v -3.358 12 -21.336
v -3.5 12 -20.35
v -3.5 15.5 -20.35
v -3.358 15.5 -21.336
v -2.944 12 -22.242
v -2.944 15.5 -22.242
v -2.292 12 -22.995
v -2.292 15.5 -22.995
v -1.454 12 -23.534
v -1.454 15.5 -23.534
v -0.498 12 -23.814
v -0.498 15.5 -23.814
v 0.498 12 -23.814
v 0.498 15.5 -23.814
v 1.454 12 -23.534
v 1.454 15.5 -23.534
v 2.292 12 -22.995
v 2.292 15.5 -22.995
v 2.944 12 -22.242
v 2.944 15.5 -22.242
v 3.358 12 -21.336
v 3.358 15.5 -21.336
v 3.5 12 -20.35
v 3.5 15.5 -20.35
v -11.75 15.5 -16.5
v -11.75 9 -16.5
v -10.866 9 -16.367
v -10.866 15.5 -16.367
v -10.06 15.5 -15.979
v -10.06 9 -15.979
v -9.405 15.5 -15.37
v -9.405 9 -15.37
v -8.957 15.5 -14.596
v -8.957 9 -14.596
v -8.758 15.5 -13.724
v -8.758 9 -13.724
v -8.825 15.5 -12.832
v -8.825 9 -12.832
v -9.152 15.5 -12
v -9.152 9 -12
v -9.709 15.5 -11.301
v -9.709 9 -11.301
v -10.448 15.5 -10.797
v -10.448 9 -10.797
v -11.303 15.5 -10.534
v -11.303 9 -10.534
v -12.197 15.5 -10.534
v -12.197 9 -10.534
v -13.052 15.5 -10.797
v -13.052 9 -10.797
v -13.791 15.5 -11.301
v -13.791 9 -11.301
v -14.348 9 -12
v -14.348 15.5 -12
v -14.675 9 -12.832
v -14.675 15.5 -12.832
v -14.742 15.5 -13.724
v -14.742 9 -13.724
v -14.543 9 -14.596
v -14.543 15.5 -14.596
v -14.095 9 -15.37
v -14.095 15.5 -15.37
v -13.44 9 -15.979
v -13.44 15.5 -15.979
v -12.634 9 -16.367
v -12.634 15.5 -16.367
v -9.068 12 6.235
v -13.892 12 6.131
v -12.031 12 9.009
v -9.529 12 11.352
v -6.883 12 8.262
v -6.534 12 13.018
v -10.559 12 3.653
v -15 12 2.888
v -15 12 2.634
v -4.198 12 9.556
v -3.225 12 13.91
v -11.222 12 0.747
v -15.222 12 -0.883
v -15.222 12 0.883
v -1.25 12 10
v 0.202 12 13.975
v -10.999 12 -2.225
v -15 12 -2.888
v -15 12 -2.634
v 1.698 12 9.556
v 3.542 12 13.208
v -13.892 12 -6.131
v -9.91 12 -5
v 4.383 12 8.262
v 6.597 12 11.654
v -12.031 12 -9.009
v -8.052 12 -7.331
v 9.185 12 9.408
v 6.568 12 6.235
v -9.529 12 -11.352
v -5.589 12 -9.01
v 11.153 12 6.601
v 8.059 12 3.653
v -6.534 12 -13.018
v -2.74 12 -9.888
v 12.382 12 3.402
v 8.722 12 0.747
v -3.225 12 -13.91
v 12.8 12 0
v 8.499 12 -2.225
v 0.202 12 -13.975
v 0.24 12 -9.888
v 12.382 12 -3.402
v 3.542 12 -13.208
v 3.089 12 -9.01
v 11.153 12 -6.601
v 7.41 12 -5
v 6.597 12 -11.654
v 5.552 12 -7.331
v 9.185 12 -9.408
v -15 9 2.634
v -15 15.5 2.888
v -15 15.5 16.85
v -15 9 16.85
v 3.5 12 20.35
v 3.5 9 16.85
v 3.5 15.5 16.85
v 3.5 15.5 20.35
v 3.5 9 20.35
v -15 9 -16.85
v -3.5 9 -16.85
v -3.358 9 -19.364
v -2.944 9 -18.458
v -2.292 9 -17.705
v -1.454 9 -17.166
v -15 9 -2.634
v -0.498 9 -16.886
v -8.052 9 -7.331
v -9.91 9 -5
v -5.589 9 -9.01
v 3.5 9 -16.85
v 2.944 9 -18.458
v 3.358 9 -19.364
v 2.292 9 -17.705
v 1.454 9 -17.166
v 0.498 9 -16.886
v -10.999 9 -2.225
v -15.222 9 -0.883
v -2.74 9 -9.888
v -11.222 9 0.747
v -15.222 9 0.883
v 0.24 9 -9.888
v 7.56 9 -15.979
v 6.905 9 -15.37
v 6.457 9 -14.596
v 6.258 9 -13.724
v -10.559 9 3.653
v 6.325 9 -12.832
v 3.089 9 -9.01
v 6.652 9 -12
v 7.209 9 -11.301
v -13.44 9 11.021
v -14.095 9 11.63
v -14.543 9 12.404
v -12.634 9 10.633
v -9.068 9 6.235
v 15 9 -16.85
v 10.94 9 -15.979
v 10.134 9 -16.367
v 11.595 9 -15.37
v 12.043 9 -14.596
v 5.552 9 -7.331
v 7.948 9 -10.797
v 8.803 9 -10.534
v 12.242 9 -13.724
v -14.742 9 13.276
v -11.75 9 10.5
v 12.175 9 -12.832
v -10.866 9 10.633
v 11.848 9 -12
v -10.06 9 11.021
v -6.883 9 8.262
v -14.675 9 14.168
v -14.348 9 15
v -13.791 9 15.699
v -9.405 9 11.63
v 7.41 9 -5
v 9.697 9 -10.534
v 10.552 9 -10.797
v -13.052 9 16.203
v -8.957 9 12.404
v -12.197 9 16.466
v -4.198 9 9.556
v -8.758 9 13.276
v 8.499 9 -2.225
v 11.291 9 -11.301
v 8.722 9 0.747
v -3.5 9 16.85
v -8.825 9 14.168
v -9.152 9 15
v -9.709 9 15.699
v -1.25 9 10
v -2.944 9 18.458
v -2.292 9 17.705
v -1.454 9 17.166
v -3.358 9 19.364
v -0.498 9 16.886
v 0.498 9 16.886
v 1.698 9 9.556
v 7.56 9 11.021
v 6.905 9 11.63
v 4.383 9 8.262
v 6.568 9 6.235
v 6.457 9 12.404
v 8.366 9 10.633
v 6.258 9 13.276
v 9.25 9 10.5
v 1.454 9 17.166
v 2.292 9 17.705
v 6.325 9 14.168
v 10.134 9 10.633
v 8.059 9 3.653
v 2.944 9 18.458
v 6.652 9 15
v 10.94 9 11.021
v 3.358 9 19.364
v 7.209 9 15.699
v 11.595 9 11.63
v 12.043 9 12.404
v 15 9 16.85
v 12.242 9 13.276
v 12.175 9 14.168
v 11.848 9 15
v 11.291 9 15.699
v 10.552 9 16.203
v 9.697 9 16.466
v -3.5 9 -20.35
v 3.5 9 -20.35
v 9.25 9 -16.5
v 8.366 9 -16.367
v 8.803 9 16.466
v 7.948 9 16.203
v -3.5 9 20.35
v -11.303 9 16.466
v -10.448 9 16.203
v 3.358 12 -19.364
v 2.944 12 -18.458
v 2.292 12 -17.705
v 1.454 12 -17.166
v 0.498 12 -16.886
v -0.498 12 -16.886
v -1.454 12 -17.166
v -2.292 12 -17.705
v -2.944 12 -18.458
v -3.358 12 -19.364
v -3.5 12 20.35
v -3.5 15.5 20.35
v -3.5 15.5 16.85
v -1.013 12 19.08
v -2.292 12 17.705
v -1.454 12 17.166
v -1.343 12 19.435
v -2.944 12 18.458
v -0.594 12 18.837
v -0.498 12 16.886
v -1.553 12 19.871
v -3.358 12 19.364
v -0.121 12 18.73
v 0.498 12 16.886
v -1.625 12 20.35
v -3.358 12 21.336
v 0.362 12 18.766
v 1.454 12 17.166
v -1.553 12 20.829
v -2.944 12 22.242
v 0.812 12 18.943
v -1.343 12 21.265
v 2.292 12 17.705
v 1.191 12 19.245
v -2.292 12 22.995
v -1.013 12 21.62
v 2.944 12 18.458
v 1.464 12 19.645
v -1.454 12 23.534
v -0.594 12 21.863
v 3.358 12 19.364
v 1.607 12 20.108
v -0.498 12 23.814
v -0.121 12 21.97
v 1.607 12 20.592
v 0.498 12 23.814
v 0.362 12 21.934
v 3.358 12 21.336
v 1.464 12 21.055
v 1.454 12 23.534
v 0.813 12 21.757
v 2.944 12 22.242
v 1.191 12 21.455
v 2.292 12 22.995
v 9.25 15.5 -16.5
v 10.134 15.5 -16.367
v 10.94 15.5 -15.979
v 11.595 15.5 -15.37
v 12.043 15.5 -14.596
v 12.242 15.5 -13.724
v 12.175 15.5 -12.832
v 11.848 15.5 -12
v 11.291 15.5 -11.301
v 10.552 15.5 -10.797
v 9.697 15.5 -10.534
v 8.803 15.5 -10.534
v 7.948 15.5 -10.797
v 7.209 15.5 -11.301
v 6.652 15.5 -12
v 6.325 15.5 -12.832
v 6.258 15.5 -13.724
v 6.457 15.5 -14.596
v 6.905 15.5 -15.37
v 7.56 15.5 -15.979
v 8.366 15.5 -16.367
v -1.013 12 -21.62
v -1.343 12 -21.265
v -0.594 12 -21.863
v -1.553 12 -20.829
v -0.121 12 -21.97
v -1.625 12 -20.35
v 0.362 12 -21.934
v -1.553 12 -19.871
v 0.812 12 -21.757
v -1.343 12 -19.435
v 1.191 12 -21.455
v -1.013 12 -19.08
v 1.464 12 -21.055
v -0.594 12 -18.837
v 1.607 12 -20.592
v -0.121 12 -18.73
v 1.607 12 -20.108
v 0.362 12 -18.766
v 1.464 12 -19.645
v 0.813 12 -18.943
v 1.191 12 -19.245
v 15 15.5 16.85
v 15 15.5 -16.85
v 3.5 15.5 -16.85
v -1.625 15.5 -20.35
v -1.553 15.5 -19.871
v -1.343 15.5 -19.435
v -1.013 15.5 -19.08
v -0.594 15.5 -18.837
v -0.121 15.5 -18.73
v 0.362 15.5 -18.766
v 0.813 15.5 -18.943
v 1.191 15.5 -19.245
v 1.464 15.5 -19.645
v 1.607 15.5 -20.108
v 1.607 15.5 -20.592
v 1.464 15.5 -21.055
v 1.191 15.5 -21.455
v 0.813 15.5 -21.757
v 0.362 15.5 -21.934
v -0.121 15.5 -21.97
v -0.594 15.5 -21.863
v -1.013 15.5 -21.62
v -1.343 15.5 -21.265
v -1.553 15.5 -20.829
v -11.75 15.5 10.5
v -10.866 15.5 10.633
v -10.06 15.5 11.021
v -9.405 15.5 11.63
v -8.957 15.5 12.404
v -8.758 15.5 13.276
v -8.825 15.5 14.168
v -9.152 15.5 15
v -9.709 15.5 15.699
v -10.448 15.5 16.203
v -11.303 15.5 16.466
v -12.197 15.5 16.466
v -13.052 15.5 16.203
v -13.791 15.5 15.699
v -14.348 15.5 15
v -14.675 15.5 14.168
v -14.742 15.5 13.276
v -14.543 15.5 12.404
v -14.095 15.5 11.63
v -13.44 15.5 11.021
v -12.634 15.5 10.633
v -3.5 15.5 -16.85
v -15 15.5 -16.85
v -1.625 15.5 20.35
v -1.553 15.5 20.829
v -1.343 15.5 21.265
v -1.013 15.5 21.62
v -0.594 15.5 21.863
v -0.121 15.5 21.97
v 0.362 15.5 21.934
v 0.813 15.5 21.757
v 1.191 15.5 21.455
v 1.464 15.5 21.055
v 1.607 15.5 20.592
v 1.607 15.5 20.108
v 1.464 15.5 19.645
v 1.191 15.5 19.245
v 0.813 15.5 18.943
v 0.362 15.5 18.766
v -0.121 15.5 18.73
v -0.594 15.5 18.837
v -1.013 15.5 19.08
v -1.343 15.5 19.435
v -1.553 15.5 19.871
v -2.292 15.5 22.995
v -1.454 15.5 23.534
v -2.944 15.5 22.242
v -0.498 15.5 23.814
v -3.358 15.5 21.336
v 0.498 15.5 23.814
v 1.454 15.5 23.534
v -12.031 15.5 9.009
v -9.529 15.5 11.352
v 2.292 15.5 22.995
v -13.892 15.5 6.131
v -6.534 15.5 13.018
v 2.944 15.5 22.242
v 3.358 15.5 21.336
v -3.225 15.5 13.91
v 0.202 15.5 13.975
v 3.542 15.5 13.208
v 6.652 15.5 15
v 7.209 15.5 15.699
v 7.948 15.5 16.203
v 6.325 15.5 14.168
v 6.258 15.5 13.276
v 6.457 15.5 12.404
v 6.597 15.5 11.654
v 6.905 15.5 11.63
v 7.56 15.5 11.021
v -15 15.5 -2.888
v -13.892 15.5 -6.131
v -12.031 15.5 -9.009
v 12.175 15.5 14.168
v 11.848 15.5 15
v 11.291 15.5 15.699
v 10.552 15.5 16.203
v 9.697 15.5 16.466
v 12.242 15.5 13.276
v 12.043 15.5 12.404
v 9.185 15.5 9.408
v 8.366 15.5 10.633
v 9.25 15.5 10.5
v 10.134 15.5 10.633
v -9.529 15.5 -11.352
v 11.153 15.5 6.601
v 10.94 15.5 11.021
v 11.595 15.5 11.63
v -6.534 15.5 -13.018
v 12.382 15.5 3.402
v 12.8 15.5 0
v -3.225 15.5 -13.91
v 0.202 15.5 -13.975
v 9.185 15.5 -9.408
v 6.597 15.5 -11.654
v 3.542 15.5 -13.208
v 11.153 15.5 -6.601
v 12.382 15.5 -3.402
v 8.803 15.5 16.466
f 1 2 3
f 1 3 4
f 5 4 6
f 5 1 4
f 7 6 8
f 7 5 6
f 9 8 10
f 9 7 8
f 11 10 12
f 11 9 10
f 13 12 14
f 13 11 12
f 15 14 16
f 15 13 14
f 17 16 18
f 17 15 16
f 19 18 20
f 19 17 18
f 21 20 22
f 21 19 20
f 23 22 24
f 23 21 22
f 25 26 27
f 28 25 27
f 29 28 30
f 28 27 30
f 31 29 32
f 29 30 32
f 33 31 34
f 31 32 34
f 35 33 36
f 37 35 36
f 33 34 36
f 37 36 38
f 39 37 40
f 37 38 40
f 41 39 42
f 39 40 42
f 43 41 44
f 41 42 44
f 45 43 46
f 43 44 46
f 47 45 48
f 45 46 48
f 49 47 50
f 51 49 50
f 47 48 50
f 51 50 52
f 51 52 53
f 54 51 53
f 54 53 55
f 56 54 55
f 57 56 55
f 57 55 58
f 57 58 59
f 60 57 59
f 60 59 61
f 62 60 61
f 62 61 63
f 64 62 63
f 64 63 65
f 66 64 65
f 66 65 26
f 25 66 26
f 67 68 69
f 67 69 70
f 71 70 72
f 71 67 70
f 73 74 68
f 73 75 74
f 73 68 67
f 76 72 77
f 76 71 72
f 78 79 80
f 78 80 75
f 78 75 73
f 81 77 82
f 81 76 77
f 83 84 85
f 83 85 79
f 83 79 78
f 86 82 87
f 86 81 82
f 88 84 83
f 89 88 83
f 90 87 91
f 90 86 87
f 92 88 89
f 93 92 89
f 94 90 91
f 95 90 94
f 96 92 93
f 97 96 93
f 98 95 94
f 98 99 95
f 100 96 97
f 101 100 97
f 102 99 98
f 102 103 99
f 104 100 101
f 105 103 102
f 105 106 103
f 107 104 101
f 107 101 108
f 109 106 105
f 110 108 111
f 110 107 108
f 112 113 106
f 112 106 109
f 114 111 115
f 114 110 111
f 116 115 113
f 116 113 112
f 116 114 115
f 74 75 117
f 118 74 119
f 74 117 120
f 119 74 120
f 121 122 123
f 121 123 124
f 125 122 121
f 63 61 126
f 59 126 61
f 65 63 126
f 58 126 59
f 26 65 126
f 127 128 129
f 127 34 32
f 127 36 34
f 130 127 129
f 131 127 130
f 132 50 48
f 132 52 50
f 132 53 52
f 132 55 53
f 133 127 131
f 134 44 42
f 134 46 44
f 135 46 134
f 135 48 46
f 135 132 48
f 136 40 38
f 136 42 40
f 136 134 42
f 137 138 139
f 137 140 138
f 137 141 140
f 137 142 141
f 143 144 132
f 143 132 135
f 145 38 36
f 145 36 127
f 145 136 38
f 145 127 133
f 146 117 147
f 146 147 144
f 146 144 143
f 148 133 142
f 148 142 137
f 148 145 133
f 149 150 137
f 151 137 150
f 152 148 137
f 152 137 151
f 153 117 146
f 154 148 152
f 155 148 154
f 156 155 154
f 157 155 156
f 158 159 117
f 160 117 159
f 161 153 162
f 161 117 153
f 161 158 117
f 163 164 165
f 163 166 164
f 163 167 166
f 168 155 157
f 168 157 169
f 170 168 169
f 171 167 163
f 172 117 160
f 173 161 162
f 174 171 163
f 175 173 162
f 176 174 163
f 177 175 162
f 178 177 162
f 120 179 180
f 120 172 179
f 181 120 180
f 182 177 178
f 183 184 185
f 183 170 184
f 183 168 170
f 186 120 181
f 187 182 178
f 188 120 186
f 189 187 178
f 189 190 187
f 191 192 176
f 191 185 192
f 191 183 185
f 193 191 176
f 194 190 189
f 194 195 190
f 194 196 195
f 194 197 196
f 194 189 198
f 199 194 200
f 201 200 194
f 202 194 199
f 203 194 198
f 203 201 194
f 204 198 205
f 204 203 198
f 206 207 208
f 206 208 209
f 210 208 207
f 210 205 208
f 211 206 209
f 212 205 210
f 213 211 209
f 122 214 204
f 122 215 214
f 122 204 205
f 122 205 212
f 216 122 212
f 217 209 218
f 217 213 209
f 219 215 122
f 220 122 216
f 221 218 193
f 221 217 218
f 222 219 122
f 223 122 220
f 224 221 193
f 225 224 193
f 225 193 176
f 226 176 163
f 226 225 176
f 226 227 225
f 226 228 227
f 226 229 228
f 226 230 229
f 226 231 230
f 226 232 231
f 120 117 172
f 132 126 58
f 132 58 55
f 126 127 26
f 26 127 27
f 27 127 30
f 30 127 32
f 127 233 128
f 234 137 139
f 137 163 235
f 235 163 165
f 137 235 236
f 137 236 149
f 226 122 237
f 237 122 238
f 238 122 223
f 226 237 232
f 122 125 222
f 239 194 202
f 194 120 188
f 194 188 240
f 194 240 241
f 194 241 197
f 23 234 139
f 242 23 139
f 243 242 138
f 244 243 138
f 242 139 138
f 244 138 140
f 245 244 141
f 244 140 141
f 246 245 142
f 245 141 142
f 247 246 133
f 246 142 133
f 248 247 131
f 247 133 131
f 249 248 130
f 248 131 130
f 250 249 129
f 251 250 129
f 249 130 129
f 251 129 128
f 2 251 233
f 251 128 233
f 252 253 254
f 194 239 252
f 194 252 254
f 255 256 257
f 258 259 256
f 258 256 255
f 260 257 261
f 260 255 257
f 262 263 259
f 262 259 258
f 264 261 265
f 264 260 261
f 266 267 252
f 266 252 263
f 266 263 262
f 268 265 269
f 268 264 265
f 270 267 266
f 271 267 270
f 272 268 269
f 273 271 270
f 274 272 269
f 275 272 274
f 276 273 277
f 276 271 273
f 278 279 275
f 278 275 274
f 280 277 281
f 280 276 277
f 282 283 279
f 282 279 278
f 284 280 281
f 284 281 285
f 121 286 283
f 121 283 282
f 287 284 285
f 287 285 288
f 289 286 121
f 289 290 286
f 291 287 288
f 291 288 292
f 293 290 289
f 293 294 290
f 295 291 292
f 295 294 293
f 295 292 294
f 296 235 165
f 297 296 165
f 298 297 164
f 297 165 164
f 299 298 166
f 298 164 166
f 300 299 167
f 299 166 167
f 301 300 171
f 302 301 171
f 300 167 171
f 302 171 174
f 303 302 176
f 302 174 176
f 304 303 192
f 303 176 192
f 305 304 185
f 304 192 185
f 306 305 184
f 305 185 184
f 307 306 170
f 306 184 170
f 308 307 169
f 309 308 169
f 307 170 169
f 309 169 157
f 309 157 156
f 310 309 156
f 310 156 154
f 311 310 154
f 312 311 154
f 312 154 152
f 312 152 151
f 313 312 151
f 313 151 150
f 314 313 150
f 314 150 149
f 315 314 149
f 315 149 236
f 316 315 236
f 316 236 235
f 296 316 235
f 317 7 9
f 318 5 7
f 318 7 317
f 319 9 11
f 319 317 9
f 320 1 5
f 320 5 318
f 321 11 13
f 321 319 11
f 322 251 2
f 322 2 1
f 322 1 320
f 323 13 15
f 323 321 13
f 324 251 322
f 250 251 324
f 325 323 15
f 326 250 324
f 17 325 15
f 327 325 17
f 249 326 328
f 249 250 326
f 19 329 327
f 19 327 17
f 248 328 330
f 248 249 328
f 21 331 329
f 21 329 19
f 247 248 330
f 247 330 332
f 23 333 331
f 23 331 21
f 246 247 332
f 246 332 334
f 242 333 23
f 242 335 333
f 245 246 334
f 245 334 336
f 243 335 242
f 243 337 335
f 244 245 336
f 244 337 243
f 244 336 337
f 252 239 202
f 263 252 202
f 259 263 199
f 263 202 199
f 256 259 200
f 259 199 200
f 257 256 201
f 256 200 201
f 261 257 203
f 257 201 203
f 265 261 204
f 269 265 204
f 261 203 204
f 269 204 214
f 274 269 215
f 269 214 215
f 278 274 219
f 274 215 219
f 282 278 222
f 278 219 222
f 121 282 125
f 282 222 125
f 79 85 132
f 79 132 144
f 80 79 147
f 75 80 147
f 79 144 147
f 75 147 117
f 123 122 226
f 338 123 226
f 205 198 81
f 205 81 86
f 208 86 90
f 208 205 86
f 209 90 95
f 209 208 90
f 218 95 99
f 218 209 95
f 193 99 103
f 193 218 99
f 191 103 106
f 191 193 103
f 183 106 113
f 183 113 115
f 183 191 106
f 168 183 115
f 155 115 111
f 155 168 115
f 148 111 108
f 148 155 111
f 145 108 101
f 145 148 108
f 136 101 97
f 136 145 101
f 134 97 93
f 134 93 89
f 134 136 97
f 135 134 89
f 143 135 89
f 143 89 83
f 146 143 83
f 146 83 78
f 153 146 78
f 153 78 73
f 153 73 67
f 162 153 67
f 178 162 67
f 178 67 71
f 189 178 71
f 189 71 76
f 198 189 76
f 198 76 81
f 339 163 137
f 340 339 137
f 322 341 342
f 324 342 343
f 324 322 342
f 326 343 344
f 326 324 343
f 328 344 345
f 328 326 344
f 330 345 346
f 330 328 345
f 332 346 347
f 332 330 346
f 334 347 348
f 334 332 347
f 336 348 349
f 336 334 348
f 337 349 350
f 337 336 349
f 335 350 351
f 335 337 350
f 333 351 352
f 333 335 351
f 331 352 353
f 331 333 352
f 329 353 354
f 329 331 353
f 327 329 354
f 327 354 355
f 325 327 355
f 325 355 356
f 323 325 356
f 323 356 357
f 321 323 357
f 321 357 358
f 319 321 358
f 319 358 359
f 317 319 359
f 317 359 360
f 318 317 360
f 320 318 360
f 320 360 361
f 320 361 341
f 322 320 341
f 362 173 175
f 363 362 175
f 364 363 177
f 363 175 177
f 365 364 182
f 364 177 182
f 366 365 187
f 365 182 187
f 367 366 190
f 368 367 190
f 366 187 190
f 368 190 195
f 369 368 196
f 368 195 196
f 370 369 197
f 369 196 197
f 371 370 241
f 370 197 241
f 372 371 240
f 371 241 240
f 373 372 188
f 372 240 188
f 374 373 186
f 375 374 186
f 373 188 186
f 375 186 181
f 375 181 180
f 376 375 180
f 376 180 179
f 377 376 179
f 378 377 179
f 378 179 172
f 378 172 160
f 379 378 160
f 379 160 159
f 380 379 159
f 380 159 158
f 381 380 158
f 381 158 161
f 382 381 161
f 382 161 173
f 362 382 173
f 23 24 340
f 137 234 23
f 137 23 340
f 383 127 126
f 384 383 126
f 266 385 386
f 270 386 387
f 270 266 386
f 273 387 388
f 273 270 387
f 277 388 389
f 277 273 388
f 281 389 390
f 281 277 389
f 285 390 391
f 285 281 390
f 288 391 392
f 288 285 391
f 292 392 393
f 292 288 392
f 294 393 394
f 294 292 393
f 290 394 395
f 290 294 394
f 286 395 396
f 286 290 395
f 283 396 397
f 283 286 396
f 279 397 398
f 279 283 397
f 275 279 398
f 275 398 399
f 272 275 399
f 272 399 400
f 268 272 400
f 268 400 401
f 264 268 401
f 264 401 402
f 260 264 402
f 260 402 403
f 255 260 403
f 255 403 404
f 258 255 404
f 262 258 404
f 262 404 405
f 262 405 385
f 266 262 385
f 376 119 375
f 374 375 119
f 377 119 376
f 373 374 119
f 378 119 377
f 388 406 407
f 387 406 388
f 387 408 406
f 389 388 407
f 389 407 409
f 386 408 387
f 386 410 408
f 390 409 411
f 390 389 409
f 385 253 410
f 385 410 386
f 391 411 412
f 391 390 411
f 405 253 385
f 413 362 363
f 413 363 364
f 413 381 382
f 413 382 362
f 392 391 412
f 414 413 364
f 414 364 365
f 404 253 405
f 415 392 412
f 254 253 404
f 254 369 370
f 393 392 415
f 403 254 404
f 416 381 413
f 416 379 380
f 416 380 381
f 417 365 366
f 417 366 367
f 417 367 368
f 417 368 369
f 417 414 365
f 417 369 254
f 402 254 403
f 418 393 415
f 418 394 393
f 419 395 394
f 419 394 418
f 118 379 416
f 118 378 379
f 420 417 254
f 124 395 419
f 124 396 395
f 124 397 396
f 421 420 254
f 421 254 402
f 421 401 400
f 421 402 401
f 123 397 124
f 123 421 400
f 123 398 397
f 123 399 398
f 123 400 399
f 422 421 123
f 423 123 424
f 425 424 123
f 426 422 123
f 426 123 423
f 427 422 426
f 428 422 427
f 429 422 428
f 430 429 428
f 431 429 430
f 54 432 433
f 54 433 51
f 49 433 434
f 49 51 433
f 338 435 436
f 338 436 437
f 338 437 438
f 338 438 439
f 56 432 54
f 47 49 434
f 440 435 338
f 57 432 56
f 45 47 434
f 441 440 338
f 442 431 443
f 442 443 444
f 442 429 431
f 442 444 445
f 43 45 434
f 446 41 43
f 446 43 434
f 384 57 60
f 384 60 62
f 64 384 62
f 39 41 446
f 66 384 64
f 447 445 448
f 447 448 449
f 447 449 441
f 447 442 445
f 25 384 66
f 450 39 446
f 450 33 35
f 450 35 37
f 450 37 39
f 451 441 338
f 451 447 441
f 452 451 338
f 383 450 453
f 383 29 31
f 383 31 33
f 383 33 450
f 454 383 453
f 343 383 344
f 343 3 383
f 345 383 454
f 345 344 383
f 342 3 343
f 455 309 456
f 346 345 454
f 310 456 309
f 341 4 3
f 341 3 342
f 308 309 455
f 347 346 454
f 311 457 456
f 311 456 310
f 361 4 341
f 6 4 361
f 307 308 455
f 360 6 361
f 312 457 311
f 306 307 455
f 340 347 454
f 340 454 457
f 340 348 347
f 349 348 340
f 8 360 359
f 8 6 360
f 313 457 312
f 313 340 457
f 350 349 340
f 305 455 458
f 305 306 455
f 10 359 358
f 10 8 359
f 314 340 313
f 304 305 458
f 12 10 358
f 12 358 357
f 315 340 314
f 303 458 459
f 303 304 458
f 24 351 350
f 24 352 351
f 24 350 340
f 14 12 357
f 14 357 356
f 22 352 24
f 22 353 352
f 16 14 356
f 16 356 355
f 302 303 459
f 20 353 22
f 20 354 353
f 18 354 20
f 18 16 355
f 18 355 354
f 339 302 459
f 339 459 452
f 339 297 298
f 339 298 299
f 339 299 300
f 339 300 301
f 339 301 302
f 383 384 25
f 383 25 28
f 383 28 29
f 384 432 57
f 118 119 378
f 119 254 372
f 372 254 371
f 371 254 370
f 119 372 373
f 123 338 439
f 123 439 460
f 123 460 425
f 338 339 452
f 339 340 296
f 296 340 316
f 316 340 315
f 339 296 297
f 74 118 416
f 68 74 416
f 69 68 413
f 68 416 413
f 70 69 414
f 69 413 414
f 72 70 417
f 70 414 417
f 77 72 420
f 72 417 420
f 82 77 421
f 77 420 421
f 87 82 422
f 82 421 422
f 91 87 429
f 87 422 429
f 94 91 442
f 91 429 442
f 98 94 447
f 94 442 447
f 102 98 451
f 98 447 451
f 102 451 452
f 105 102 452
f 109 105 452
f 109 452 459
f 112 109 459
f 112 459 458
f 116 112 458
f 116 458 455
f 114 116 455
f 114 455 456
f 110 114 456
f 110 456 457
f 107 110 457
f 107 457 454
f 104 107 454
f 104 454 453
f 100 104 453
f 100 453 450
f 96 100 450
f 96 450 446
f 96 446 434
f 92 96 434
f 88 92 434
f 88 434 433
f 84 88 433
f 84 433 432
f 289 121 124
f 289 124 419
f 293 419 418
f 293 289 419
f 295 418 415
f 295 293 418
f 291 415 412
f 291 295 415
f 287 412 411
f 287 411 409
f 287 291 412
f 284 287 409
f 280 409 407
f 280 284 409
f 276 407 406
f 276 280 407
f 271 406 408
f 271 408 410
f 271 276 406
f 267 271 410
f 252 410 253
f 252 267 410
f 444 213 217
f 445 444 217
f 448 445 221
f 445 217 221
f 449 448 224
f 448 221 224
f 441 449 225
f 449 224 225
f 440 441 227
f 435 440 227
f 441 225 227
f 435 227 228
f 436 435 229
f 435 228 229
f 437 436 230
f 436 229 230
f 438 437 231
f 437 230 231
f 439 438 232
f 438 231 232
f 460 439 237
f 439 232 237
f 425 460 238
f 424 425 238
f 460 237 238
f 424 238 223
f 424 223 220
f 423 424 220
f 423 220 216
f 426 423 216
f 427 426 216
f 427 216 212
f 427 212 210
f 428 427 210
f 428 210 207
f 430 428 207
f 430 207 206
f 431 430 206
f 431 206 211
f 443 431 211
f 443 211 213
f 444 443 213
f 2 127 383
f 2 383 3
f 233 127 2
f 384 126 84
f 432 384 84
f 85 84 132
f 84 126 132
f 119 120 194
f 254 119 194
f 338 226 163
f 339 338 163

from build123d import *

# Parameters (mm, degrees)
SKETCH1_R           = 1.375
SKETCH1_R_2         = 1.460845326
SKETCH1_R_3         = 1.480655282
BOSS_EXTRUDE1_DEPTH = 15
BOSS_EXTRUDE2_START = -8
SKETCH2_R           = 14
SKETCH2_R_2         = 10
BOSS_EXTRUDE2_DEPTH = 8
CUT_EXTRUDE1_START  = -3
SKETCH3_R           = 14
SKETCH3_R_2         = 10
CUT_EXTRUDE1_DEPTH  = 3
SKETCH5_R           = 1.480655282
SKETCH5_R_2         = 1.375
SKETCH5_R_3         = 1.460845326
BOSS_EXTRUDE3_DEPTH = 0.5
SKETCH6_W           = 32.415484222
SKETCH6_H           = 34.71462202
CUT_EXTRUDE2_DEPTH  = 7
SKETCH7_W           = 33.435139342
SKETCH7_H           = 35.82697306
CUT_EXTRUDE3_DEPTH  = 2
BOSS_EXTRUDE4_DEPTH = 6.5
SKETCH9_R           = 3.5
SKETCH9_R_2         = 1.625
CUT_EXTRUDE4_DEPTH  = 3
SKETCH10_R          = 3
CUT_EXTRUDE5_DEPTH  = 28
SKETCH11_R          = 14.05
CUT_EXTRUDE6_DEPTH  = 3.5


with BuildPart() as part:
    # Sketch1 → Boss-Extrude1 (new body)
    with BuildSketch(Plane(origin=(0, 0, 0), x_dir=(1, 0, 0), z_dir=(0, 1, 0))):
        with BuildLine():
            Line((-15, -16.85), (15, -16.85))
            Line((15, -16.85), (15, 16.85))
            Line((15, 16.85), (-15, 16.85))
            Line((-15, 16.85), (-15, 2.633913438))
            ThreePointArc((-15, 2.633913438), (0.072875656, 13.937359865), (12.75, 0))
            ThreePointArc((12.75, 0), (0.072875656, -13.937359865), (-15, -2.633913438))
            Line((-15, -2.633913438), (-15, -16.85))
        make_face()
        with Locations(Location((-11.75, -13.5, 0), (0, 0, 270))):
            Circle(SKETCH1_R, mode=Mode.SUBTRACT)
        with Locations(Location((9.25, -13.5, 0), (0, 0, 270))):
            Circle(SKETCH1_R_2, mode=Mode.SUBTRACT)
        with Locations(Location((-11.75, 13.5, 0), (0, 0, 270))):
            Circle(SKETCH1_R, mode=Mode.SUBTRACT)
        with Locations(Location((9.25, 13.5, 0), (0, 0, 270))):
            Circle(SKETCH1_R_3, mode=Mode.SUBTRACT)
    extrude(amount=BOSS_EXTRUDE1_DEPTH)

    # Sketch2 → Boss-Extrude2 (add)
    with BuildSketch(Plane(origin=(0, 15, 0), x_dir=(1, 0, 0), z_dir=(0, 1, 0)).offset(BOSS_EXTRUDE2_START)):
        with Locations((-1.25, 0)):
            Circle(SKETCH2_R)
        with Locations(Location((-1.25, 0, 0), (0, 0, 270))):
            Circle(SKETCH2_R_2, mode=Mode.SUBTRACT)
    extrude(amount=BOSS_EXTRUDE2_DEPTH)

    # Sketch3 → Cut-Extrude1 (cut)
    with BuildSketch(Plane(origin=(0, 15, 0), x_dir=(1, 0, 0), z_dir=(0, 1, 0)).offset(CUT_EXTRUDE1_START)):
        with Locations((-1.25, 0)):
            Circle(SKETCH3_R)
        with Locations(Location((-1.25, 0, 0), (0, 0, 270))):
            Circle(SKETCH3_R_2, mode=Mode.SUBTRACT)
    extrude(amount=CUT_EXTRUDE1_DEPTH, mode=Mode.SUBTRACT)

    # Sketch5 → Boss-Extrude3 (add)
    with BuildSketch(Plane(origin=(0, 15, 0), x_dir=(1, 0, 0), z_dir=(0, 1, 0))):
        with BuildLine():
            Line((-15, 16.85), (-15, 2.633913438))
            ThreePointArc((-15, 2.633913438), (12.75, 0), (-15, -2.633913438))
            Line((-15, -2.633913438), (-15, -16.85))
            Line((-15, -16.85), (15, -16.85))
            Line((15, -16.85), (15, 16.85))
            Line((15, 16.85), (-15, 16.85))
        make_face()
        with Locations(Location((9.25, 13.5, 0), (0, 0, 270))):
            Circle(SKETCH5_R, mode=Mode.SUBTRACT)
        with Locations(Location((-11.75, -13.5, 0), (0, 0, 270))):
            Circle(SKETCH5_R_2, mode=Mode.SUBTRACT)
        with Locations(Location((-11.75, 13.5, 0), (0, 0, 270))):
            Circle(SKETCH5_R_2, mode=Mode.SUBTRACT)
        with Locations(Location((9.25, -13.5, 0), (0, 0, 270))):
            Circle(SKETCH5_R_3, mode=Mode.SUBTRACT)
    extrude(amount=BOSS_EXTRUDE3_DEPTH)

    # Sketch6 → Cut-Extrude2 (cut)
    with BuildSketch(Plane.XZ):
        Rectangle(SKETCH6_W, SKETCH6_H)
    extrude(amount=-CUT_EXTRUDE2_DEPTH, mode=Mode.SUBTRACT)

    # Sketch7 → Cut-Extrude3 (cut)
    with BuildSketch(Plane.XZ.offset(-7)):
        Rectangle(SKETCH7_W, SKETCH7_H)
    extrude(amount=-CUT_EXTRUDE3_DEPTH, mode=Mode.SUBTRACT)

    # Sketch8 → Boss-Extrude4 (add)
    with BuildSketch(Plane.XZ.offset(-9)):
        with BuildLine():
            Line((3.5, 16.85), (3.5, 20.35))
            ThreePointArc((3.5, 20.35), (2.474873725, 17.875126257), (-2.6e-08, 16.85))
            Line((-2.6e-08, 16.85), (3.5, 16.85))
        make_face()
        with BuildLine():
            ThreePointArc((-2.6e-08, 16.85), (-2.474873743, 17.875126275), (-3.5, 20.35))
            Line((-3.5, 20.35), (-3.5, 16.85))
            Line((-3.5, 16.85), (-2.6e-08, 16.85))
        make_face()
        with BuildLine():
            ThreePointArc((-1.625, 20.35), (0, 21.975), (1.625, 20.35))
            Line((1.625, 20.35), (3.5, 20.35))
            ThreePointArc((3.5, 20.35), (0, 23.85), (-3.5, 20.35))
            Line((-3.5, 20.35), (-1.625, 20.35))
        make_face()
        with BuildLine():
            Line((3.5, 20.35), (1.625, 20.35))
            ThreePointArc((1.625, 20.35), (0, 18.725), (-1.625, 20.35))
            Line((-1.625, 20.35), (-3.5, 20.35))
            ThreePointArc((-3.5, 20.35), (-2.474873743, 17.875126275), (-2.6e-08, 16.85))
            ThreePointArc((-2.6e-08, 16.85), (2.474873725, 17.875126257), (3.5, 20.35))
        make_face()
        with BuildLine():
            Line((3.5, -20.35), (3.5, -16.85))
            Line((3.5, -16.85), (0, -16.85))
            ThreePointArc((0, -16.85), (2.474873734, -17.875126266), (3.5, -20.35))
        make_face()
        with BuildLine():
            ThreePointArc((-3.5, -20.35), (-2.474873734, -17.875126266), (0, -16.85))
            Line((0, -16.85), (-3.5, -16.85))
            Line((-3.5, -16.85), (-3.5, -20.35))
        make_face()
        with BuildLine():
            ThreePointArc((-3.5, -20.35), (0, -23.85), (3.5, -20.35))
            Line((3.5, -20.35), (1.625, -20.35))
            ThreePointArc((1.625, -20.35), (0, -21.975), (-1.625, -20.35))
            Line((-1.625, -20.35), (-3.5, -20.35))
        make_face()
        with BuildLine():
            Line((1.625, -20.35), (3.5, -20.35))
            ThreePointArc((3.5, -20.35), (2.474873734, -17.875126266), (0, -16.85))
            ThreePointArc((0, -16.85), (-2.474873734, -17.875126266), (-3.5, -20.35))
            Line((-3.5, -20.35), (-1.625, -20.35))
            ThreePointArc((-1.625, -20.35), (0, -18.725), (1.625, -20.35))
        make_face()
    extrude(amount=-BOSS_EXTRUDE4_DEPTH)

    # Sketch9 → Cut-Extrude4 (cut)
    # profile 1 of 2: a face of its own
    with BuildSketch(Plane.XZ.offset(-9)):
        with Locations((0, 20.35)):
            Circle(SKETCH9_R)
        with Locations(Location((0, 20.35, 0), (0, 0, 270))):
            Circle(SKETCH9_R_2, mode=Mode.SUBTRACT)
    # profile 2 of 2: a face of its own
    with BuildSketch(Plane.XZ.offset(-9)):
        with Locations((0, -20.35)):
            Circle(SKETCH9_R)
        with Locations(Location((0, -20.35, 0), (0, 0, 270))):
            Circle(SKETCH9_R_2, mode=Mode.SUBTRACT)
    extrude(amount=-CUT_EXTRUDE4_DEPTH, mode=Mode.SUBTRACT)

    # Sketch10 → Cut-Extrude5 (cut)
    with BuildSketch(Plane.XZ.offset(-9)):
        with Locations(Location((-11.75, 13.5, 0), (0, 0, 270))):
            Circle(SKETCH10_R)
        with Locations(Location((9.25, 13.5, 0), (0, 0, 270))):
            Circle(SKETCH10_R)
        with Locations(Location((9.25, -13.5, 0), (0, 0, 270))):
            Circle(SKETCH10_R)
        with Locations(Location((-11.75, -13.5, 0), (0, 0, 270))):
            Circle(SKETCH10_R)
    extrude(amount=-CUT_EXTRUDE5_DEPTH, mode=Mode.SUBTRACT)

    # Sketch11 → Cut-Extrude6 (cut)
    with BuildSketch(Plane(origin=(0, 15.5, 0), x_dir=(1, 0, 0), z_dir=(0, 1, 0))):
        with Locations((-1.25, 0)):
            Circle(SKETCH11_R)
    extrude(amount=-CUT_EXTRUDE6_DEPTH, mode=Mode.SUBTRACT)


solid = part.part
